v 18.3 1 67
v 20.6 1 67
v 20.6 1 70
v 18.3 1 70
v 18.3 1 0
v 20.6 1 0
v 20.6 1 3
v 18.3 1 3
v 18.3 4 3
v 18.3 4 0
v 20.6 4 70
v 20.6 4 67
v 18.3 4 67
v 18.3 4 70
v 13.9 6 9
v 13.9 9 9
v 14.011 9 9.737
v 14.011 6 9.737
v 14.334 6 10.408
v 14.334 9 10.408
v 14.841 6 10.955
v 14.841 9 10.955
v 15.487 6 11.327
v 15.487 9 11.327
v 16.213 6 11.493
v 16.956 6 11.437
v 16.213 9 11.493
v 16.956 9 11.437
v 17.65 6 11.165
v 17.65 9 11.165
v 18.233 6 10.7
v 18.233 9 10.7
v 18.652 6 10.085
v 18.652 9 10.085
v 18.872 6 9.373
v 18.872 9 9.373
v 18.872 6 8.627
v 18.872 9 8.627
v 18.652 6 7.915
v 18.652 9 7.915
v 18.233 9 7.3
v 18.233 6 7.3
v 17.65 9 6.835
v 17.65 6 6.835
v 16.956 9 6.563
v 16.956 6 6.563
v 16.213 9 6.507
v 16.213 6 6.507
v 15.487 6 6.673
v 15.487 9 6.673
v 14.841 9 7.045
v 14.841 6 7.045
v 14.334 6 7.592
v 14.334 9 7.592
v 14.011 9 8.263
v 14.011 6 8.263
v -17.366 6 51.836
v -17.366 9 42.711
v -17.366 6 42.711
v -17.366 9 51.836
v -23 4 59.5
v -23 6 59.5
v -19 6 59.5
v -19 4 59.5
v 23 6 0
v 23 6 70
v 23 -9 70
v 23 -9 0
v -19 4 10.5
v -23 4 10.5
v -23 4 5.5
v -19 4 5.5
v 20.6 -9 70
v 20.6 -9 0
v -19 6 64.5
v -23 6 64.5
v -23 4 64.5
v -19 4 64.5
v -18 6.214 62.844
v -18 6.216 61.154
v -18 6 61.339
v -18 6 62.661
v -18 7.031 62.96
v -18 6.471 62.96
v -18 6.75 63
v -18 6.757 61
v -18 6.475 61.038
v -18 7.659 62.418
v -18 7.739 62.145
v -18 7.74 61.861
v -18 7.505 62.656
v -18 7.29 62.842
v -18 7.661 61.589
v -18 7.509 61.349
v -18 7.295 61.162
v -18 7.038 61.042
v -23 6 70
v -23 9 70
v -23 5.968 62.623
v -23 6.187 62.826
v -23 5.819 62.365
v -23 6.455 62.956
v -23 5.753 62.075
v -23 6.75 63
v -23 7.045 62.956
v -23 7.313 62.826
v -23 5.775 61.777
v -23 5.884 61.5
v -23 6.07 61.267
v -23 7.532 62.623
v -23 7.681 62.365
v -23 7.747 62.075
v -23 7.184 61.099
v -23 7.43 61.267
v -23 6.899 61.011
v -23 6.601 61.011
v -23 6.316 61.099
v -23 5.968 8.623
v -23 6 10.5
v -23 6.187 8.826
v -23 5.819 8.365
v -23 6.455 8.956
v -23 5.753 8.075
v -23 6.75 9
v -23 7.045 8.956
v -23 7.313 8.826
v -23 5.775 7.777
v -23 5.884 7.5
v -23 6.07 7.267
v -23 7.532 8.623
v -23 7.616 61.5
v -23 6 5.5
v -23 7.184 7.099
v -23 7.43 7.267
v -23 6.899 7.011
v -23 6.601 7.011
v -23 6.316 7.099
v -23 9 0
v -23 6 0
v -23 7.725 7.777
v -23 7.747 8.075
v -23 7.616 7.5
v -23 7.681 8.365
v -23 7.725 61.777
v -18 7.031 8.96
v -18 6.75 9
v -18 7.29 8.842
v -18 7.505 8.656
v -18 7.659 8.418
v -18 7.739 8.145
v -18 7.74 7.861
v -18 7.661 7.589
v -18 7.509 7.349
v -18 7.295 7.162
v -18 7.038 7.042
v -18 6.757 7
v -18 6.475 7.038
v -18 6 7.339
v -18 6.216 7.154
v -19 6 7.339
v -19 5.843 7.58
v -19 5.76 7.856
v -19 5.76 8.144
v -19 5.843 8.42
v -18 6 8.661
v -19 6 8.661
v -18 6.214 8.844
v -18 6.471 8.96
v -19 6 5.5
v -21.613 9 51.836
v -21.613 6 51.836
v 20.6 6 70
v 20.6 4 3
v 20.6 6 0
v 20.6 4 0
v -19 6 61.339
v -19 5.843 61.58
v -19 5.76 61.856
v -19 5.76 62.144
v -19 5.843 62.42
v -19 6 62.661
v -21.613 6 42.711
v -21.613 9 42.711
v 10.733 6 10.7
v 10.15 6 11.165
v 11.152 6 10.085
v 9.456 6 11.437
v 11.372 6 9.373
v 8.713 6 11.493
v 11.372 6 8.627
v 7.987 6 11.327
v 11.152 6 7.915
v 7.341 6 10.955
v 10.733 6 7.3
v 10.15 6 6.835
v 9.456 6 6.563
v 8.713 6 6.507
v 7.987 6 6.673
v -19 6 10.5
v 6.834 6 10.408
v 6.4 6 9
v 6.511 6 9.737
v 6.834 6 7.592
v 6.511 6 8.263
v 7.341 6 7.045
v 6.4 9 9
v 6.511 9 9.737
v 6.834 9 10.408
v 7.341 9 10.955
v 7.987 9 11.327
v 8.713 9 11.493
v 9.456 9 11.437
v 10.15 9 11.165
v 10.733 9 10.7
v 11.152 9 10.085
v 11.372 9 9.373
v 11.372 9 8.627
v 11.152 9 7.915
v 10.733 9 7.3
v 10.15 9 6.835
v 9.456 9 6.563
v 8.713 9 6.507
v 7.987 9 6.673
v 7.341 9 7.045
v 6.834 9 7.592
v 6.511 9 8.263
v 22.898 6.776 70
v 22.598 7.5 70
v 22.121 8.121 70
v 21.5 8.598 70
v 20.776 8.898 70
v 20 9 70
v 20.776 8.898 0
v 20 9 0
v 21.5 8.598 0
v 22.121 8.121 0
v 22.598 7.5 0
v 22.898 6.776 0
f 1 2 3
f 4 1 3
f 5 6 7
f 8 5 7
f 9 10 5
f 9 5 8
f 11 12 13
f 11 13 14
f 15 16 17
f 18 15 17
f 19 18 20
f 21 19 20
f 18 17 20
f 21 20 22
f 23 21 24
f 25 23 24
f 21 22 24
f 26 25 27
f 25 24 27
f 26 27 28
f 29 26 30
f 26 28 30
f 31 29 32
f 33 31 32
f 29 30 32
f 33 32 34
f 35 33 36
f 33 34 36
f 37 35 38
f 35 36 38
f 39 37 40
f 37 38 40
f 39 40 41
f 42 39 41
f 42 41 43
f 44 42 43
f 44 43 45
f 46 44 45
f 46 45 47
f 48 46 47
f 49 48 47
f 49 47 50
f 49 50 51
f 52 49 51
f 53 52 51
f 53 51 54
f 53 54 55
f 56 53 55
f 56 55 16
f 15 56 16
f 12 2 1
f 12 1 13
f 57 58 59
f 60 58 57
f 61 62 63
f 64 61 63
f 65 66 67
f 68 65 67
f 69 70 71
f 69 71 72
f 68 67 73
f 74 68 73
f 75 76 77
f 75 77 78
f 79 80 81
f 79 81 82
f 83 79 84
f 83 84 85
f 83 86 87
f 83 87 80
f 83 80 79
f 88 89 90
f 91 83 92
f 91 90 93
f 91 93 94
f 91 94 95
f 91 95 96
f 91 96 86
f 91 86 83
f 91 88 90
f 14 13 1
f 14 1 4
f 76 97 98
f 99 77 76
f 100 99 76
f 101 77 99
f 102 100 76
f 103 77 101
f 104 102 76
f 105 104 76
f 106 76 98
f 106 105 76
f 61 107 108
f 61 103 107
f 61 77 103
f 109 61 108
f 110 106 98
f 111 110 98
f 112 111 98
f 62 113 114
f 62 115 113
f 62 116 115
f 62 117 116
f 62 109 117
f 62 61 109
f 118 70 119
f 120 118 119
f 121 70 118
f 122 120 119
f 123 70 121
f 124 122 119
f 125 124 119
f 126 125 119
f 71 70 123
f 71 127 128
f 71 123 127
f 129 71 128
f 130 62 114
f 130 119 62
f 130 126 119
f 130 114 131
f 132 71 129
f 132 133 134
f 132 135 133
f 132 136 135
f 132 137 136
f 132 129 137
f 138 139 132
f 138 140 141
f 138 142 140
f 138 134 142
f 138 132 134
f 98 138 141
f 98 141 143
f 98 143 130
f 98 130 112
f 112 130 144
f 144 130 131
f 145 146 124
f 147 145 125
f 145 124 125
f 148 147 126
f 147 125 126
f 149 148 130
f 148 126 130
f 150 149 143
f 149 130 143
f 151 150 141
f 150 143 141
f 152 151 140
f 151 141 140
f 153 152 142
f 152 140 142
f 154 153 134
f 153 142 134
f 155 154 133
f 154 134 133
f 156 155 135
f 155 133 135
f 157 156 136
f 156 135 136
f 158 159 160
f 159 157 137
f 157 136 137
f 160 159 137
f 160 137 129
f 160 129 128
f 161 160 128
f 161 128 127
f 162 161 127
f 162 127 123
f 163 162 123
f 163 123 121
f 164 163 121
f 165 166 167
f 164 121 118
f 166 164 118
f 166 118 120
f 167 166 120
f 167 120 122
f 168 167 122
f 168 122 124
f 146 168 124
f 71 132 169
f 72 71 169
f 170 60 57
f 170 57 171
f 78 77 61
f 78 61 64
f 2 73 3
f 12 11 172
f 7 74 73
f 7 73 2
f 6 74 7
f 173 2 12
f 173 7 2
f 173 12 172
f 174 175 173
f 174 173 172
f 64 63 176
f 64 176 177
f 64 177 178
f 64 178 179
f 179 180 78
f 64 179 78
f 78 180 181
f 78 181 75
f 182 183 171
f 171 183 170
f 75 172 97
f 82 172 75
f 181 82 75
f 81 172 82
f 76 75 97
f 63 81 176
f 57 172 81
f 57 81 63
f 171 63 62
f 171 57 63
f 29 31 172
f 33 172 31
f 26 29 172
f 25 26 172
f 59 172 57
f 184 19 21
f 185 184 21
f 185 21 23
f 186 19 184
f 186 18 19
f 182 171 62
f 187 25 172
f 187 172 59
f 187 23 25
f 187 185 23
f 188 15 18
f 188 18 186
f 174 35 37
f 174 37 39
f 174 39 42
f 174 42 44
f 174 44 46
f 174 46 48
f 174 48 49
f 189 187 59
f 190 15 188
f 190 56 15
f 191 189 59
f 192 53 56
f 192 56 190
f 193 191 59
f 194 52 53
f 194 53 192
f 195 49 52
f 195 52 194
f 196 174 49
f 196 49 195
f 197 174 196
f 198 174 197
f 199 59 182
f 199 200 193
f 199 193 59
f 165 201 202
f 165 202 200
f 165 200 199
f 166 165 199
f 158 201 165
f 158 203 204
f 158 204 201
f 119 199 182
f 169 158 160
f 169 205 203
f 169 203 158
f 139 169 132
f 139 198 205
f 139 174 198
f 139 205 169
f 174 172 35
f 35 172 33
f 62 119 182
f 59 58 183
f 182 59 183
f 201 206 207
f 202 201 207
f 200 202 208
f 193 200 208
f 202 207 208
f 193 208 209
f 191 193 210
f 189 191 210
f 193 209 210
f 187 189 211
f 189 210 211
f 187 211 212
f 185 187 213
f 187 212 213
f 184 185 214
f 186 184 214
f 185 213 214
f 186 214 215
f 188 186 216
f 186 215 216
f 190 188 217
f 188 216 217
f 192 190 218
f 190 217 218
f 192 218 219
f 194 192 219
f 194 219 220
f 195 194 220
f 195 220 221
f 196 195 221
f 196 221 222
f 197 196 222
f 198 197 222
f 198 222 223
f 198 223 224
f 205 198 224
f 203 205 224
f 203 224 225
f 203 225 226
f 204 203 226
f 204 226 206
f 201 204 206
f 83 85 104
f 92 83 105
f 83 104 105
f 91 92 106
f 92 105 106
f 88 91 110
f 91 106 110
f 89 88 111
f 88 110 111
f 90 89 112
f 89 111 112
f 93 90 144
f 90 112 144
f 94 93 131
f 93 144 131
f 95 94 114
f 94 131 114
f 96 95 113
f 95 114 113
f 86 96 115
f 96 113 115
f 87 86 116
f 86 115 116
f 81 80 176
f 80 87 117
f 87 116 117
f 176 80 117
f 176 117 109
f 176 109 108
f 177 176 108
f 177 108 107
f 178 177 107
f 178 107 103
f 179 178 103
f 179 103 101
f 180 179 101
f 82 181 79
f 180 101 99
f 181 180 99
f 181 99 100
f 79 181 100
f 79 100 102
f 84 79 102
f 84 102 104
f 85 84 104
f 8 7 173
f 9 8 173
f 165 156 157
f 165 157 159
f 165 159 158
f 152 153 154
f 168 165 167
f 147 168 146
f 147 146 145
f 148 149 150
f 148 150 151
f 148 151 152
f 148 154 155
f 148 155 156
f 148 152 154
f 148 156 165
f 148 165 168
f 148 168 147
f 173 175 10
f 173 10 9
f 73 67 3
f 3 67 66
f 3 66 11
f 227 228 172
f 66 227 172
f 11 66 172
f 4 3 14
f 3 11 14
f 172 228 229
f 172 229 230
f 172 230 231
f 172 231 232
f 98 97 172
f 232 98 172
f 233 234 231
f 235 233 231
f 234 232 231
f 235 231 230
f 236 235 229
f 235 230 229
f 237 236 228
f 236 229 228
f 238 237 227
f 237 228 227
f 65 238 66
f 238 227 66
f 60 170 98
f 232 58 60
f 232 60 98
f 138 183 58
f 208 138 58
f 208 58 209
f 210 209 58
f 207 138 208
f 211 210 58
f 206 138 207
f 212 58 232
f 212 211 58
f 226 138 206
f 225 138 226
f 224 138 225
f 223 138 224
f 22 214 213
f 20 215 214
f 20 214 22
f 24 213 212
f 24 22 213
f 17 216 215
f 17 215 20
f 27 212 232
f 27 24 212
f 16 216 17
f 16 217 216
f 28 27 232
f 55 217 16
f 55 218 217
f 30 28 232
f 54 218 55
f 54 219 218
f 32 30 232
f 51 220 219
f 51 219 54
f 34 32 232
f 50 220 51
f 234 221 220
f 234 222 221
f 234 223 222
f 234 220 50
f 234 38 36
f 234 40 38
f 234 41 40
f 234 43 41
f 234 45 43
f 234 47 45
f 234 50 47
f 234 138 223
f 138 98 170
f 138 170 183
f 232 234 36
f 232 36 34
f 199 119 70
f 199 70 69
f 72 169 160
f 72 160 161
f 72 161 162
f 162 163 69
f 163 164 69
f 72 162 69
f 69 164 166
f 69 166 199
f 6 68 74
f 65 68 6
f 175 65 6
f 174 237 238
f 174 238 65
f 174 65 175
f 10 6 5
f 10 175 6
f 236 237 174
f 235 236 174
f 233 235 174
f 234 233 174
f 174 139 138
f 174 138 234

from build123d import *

# Parameters (mm, degrees)
EXTRUDE1_DEPTH     = 70
SKETCH2_W          = 3
SKETCH2_H          = 3
EXTRUDE2_DEPTH     = 2.3
SKETCH3_W          = 4
SKETCH3_H          = 5
EXTRUDE3_DEPTH     = 2
SKETCH4_R          = 1
EXTRUDE4_DEPTH     = 5
FILLET1_R          = 3
SKETCH5_R          = 2.5
EXTRUDE6_DEPTH     = 5
SKETCH6_W          = 4.247308601
SKETCH6_H          = 9.124947865
CUT_EXTRUDE1_DEPTH = 10


with BuildPart() as part:
    # Sketch1 → Extrude1 (new body)
    with BuildSketch(Plane.XY):
        Polygon((-23, 9), (23, 9), (23, -9), (20.6, -9), (20.6, 6), (-23, 6), align=None)
    extrude(amount=EXTRUDE1_DEPTH)

    # Sketch2 → Extrude2 (add)
    with BuildSketch(Plane.ZY.offset(-20.6)):
        with Locations((1.5, 2.5)):
            Rectangle(SKETCH2_W, SKETCH2_H)
        with Locations((68.5, 2.5)):
            Rectangle(SKETCH2_W, SKETCH2_H)
    extrude(amount=EXTRUDE2_DEPTH)

    # Sketch3 → Extrude3 (add)
    with BuildSketch(Plane.XZ.offset(-6)):
        with Locations((-21, 8)):
            Rectangle(SKETCH3_W, SKETCH3_H)
        with Locations((-21, 62)):
            Rectangle(SKETCH3_W, SKETCH3_H)
    extrude(amount=EXTRUDE3_DEPTH)

    # Sketch4 → Extrude4 (cut)
    with BuildSketch(Plane.ZY.offset(23)):
        with Locations((8, 6.75)):
            Circle(SKETCH4_R)
        with Locations((62, 6.75)):
            Circle(SKETCH4_R)
    extrude(amount=-EXTRUDE4_DEPTH, mode=Mode.SUBTRACT)

    # Fillet1
    fillet1_edges = [part.edges().sort_by_distance(p)[0] for p in [
        (23, 9, 35),
    ]]
    fillet(fillet1_edges, radius=FILLET1_R)

    # Sketch5 → Extrude6 (cut)
    with BuildSketch(Plane(origin=(0, 9, 0), x_dir=(-1, 0, 0), z_dir=(0, 1, 0))):
        with Locations((-16.4, 9)):
            Circle(SKETCH5_R)
        with Locations((-8.9, 9)):
            Circle(SKETCH5_R)
    extrude(amount=-EXTRUDE6_DEPTH, mode=Mode.SUBTRACT)

    # Sketch6 → Cut-Extrude1 (cut)
    with BuildSketch(Plane(origin=(0, 9, 0), x_dir=(-1, 0, 0), z_dir=(0, 1, 0))):
        with Locations((19.489700301, 47.273609058)):
            Rectangle(SKETCH6_W, SKETCH6_H)
    extrude(amount=-CUT_EXTRUDE1_DEPTH, mode=Mode.SUBTRACT)


solid = part.part
